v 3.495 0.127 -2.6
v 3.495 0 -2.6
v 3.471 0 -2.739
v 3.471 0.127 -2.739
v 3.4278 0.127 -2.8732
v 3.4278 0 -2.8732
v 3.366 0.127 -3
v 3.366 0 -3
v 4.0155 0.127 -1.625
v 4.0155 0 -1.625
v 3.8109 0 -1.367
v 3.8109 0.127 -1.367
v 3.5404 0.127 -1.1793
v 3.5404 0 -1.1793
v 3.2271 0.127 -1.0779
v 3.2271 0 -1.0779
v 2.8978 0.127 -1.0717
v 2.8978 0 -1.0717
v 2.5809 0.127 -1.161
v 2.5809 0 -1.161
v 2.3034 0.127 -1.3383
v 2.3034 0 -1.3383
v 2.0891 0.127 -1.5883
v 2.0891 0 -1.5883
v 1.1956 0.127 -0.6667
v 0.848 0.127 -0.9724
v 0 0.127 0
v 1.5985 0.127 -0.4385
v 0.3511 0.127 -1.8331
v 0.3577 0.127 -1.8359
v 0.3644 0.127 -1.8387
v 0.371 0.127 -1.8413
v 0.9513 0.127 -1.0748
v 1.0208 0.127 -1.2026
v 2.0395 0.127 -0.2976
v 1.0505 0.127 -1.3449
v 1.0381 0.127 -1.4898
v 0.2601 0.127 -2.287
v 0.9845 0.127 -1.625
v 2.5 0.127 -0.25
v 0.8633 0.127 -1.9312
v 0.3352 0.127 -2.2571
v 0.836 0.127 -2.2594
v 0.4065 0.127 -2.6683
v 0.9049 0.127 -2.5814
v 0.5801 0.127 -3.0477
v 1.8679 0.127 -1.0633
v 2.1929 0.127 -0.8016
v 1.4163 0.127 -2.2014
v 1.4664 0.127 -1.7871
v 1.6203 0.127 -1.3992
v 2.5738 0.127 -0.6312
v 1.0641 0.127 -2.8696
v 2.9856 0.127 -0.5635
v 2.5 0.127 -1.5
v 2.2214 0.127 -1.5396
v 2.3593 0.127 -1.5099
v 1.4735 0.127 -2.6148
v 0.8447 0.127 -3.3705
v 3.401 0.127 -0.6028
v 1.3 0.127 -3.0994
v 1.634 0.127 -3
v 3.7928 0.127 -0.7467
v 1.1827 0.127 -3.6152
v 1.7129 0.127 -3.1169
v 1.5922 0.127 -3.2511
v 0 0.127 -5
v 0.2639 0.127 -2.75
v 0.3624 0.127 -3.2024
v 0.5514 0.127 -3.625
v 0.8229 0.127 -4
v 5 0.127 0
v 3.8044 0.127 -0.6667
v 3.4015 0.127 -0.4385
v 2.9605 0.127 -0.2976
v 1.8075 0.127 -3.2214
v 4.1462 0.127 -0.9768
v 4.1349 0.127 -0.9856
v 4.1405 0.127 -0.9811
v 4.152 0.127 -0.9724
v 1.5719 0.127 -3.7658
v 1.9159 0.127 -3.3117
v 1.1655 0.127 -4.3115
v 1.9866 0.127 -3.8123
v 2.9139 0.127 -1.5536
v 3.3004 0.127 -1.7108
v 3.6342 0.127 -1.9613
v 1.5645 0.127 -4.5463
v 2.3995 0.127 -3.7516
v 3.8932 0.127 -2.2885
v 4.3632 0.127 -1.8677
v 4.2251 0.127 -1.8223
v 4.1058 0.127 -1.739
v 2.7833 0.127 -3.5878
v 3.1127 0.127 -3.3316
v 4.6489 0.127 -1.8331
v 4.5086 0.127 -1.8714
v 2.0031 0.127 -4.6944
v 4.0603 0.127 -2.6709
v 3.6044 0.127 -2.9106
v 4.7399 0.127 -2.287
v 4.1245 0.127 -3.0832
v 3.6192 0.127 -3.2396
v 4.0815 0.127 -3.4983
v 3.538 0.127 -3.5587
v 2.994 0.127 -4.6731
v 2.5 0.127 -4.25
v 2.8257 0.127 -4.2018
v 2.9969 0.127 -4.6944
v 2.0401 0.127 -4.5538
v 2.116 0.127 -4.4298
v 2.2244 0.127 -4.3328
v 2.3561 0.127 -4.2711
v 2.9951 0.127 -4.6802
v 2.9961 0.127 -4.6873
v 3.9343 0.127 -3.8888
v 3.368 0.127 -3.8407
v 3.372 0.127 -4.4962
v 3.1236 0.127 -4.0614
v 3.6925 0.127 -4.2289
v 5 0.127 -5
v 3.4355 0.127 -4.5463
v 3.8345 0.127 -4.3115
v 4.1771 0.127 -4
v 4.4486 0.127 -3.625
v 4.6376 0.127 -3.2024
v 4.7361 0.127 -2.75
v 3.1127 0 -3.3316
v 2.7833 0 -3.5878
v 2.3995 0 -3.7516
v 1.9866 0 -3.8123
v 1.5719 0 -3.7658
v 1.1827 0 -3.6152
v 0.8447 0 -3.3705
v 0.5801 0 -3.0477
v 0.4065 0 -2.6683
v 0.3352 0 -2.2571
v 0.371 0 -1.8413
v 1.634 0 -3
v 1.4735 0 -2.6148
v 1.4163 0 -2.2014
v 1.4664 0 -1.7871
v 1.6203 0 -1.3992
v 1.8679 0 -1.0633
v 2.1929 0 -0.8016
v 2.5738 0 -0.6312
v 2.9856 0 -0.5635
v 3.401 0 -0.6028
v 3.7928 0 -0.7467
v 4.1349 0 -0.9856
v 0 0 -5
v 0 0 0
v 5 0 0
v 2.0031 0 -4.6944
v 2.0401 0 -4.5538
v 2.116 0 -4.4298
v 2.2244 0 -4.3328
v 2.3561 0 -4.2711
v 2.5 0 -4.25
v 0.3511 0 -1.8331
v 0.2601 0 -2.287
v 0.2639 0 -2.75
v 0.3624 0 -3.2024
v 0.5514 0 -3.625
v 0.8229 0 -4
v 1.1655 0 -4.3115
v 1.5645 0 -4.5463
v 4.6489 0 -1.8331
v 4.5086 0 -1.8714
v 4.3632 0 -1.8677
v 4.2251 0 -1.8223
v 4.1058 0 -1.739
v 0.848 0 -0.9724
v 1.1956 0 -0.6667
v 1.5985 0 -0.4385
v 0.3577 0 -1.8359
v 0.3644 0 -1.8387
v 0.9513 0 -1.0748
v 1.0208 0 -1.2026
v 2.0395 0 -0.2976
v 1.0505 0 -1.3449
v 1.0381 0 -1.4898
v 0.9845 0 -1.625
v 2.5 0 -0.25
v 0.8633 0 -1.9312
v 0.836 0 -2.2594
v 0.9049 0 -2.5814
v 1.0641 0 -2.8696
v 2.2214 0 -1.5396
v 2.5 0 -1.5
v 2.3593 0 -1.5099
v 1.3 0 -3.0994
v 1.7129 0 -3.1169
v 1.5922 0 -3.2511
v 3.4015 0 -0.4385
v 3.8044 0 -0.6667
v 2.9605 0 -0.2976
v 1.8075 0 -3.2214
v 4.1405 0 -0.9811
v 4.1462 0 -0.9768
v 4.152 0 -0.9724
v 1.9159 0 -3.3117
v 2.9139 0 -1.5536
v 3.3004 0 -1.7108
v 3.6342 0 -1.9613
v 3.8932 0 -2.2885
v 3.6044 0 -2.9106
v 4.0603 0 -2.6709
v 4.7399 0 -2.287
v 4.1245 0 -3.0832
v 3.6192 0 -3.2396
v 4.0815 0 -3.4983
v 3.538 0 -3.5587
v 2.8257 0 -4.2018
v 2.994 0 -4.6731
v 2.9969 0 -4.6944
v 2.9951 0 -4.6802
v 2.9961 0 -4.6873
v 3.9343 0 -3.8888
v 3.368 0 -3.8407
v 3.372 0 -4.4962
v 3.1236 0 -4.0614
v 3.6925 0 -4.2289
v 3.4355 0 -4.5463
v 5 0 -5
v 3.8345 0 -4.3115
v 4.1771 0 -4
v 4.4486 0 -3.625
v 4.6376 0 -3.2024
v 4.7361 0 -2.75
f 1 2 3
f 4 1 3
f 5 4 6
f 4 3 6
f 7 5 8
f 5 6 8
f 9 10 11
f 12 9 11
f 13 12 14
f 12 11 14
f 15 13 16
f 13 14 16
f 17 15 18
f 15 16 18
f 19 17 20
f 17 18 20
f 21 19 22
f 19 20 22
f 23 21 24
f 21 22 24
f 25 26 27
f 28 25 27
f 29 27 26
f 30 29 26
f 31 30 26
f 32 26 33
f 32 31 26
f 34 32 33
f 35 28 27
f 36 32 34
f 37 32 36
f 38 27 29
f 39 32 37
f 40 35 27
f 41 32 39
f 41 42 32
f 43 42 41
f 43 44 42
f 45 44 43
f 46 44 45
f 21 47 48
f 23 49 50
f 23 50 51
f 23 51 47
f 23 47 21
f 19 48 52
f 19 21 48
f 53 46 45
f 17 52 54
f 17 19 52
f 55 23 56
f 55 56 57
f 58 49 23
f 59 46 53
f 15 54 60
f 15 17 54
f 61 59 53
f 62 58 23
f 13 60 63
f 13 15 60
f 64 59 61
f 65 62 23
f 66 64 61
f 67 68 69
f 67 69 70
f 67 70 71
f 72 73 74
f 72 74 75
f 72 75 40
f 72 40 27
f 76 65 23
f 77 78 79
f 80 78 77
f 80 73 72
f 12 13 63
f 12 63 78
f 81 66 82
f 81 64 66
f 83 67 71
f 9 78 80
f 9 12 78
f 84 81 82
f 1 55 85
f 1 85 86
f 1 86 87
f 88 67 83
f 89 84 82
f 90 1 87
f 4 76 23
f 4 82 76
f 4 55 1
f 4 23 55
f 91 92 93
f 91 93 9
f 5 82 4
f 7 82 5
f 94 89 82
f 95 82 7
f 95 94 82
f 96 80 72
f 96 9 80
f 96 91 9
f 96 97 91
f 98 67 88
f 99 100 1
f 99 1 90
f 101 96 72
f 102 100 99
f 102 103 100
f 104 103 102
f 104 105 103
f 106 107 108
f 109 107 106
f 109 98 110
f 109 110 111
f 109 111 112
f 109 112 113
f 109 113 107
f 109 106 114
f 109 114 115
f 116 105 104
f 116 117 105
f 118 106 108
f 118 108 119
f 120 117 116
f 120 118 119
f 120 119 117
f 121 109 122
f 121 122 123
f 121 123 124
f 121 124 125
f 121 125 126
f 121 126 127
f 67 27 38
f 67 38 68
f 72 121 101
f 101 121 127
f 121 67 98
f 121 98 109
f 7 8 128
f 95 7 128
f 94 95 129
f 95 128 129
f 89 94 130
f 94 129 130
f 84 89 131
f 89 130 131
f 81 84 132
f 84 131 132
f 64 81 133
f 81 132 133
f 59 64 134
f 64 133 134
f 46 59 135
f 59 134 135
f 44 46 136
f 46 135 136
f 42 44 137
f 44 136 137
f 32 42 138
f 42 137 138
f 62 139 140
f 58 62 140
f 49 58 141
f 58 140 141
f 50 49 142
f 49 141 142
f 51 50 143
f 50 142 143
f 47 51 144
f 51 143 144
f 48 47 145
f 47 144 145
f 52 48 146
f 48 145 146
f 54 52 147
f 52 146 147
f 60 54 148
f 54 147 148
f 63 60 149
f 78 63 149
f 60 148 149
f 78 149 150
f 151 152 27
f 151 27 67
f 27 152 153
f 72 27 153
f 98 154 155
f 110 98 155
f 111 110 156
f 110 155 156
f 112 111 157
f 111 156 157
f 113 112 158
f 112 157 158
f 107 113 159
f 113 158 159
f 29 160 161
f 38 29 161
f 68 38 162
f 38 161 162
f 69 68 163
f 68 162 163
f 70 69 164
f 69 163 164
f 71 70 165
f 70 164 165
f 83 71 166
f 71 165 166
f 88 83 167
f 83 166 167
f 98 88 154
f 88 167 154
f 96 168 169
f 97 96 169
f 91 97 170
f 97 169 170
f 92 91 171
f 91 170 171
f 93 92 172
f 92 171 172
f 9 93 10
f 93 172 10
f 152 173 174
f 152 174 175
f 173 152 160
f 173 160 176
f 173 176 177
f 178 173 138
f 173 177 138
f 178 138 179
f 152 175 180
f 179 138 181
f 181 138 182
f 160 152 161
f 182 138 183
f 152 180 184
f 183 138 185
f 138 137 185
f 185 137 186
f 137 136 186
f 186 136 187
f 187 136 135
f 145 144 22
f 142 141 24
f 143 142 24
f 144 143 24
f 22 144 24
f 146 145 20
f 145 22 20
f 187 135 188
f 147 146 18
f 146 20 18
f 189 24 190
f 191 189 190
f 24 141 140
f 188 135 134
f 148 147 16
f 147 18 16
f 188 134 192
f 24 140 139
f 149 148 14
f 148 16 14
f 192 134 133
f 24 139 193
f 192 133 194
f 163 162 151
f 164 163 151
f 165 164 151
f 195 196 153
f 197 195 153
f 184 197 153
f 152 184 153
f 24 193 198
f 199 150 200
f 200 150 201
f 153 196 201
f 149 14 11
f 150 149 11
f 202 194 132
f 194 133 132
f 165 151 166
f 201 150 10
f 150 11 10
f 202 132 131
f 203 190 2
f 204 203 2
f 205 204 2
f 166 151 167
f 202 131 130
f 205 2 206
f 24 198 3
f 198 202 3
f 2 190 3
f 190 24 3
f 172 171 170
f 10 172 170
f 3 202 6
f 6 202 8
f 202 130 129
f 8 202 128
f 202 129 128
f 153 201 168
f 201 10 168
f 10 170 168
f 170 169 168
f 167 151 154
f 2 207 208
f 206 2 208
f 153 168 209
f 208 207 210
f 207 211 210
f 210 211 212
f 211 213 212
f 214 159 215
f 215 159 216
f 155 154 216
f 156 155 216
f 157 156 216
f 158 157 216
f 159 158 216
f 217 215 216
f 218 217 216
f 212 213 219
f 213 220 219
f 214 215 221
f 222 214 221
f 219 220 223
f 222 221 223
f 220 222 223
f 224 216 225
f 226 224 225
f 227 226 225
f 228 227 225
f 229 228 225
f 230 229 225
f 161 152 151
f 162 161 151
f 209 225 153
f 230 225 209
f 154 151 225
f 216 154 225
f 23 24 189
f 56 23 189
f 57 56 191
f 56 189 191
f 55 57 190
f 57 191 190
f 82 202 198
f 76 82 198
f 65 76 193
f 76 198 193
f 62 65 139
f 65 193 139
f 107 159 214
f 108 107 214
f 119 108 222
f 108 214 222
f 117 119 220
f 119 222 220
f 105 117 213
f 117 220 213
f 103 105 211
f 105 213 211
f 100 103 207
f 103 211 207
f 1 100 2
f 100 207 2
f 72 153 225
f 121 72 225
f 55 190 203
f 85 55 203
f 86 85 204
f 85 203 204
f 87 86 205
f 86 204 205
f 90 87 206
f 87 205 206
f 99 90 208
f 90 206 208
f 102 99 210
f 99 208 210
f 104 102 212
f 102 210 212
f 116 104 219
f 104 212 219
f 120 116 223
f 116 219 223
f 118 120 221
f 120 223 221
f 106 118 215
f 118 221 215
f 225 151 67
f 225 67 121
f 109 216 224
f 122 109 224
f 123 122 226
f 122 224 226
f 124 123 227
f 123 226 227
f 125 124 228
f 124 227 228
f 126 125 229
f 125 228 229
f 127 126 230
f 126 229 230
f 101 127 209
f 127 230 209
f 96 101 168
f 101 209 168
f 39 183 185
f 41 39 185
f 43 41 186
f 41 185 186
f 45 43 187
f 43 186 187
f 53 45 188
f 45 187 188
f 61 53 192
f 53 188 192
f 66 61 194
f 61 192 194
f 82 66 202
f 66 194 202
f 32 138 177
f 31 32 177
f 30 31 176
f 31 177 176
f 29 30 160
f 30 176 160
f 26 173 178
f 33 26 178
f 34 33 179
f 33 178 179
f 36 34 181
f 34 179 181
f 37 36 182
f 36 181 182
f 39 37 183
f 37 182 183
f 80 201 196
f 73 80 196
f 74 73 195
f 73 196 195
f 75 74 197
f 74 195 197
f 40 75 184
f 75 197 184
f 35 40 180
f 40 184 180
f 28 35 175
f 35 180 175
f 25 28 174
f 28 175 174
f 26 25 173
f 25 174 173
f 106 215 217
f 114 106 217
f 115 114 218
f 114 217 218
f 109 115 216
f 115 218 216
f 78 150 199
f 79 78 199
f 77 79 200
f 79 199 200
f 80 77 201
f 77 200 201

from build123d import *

# Parameters (mm, degrees)
SKETCH1_W           = 5
SKETCH1_H           = 5
BOSS_EXTRUDE1_DEPTH = 0.127


with BuildPart() as part:
    # Sketch1 → Boss-Extrude1 (new body)
    with BuildSketch(Plane(origin=(0, 0, 0), x_dir=(1, 0, 0), z_dir=(0, 1, 0))):
        with Locations((2.5, 2.5)):
            Rectangle(SKETCH1_W, SKETCH1_H)
        with BuildLine():
            ThreePointArc((2.996903995, 4.694444444), (4.448557159, 3.625), (4.648896634, 1.833109261))
            ThreePointArc((4.648896634, 1.833109261), (4.292475213, 1.850014133), (4.015544457, 1.625))
            ThreePointArc((4.015544457, 1.625), (3.062684951, 1.062703919), (2.089108822, 1.588315603))
            ThreePointArc((2.089108822, 1.588315603), (2.289862422, 1.522328174), (2.5, 1.5))
            ThreePointArc((2.5, 1.5), (4.105654072, 2.875), (2.994047407, 4.673076923))
            ThreePointArc((2.994047407, 4.673076923), (2.995590873, 4.683745287), (2.996903995, 4.694444444))
        make_face(mode=Mode.SUBTRACT)
        with BuildLine():
            ThreePointArc((4.151992639, 0.972446295), (2.5, 0.25), (0.848007361, 0.972446295))
            ThreePointArc((0.848007361, 0.972446295), (1.04085812, 1.272663864), (0.984455543, 1.625))
            ThreePointArc((0.984455543, 1.625), (0.973922606, 2.731348579), (1.915903741, 3.311684397))
            ThreePointArc((1.915903741, 3.311684397), (1.758380151, 3.170820393), (1.633974596, 3))
            ThreePointArc((1.633974596, 3), (2.02193249, 0.921962784), (4.134916116, 0.985603933))
            ThreePointArc((4.134916116, 0.985603933), (4.143383457, 0.978933071), (4.151992639, 0.972446295))
        make_face(mode=Mode.SUBTRACT)
        with BuildLine():
            ThreePointArc((0.351103366, 1.833109261), (0.551442841, 3.625), (2.003096005, 4.694444444))
            ThreePointArc((2.003096005, 4.694444444), (2.166666667, 4.377322004), (2.5, 4.25))
            ThreePointArc((2.5, 4.25), (3.463392443, 3.705947502), (3.494987437, 2.6))
            ThreePointArc((3.494987437, 2.6), (3.451757426, 2.806851432), (3.366025404, 3))
            ThreePointArc((3.366025404, 3), (1.372413437, 3.703037216), (0.371036477, 1.841319143))
            ThreePointArc((0.371036477, 1.841319143), (0.36102567, 1.837321642), (0.351103366, 1.833109261))
        make_face(mode=Mode.SUBTRACT)
    extrude(amount=BOSS_EXTRUDE1_DEPTH)


solid = part.part
